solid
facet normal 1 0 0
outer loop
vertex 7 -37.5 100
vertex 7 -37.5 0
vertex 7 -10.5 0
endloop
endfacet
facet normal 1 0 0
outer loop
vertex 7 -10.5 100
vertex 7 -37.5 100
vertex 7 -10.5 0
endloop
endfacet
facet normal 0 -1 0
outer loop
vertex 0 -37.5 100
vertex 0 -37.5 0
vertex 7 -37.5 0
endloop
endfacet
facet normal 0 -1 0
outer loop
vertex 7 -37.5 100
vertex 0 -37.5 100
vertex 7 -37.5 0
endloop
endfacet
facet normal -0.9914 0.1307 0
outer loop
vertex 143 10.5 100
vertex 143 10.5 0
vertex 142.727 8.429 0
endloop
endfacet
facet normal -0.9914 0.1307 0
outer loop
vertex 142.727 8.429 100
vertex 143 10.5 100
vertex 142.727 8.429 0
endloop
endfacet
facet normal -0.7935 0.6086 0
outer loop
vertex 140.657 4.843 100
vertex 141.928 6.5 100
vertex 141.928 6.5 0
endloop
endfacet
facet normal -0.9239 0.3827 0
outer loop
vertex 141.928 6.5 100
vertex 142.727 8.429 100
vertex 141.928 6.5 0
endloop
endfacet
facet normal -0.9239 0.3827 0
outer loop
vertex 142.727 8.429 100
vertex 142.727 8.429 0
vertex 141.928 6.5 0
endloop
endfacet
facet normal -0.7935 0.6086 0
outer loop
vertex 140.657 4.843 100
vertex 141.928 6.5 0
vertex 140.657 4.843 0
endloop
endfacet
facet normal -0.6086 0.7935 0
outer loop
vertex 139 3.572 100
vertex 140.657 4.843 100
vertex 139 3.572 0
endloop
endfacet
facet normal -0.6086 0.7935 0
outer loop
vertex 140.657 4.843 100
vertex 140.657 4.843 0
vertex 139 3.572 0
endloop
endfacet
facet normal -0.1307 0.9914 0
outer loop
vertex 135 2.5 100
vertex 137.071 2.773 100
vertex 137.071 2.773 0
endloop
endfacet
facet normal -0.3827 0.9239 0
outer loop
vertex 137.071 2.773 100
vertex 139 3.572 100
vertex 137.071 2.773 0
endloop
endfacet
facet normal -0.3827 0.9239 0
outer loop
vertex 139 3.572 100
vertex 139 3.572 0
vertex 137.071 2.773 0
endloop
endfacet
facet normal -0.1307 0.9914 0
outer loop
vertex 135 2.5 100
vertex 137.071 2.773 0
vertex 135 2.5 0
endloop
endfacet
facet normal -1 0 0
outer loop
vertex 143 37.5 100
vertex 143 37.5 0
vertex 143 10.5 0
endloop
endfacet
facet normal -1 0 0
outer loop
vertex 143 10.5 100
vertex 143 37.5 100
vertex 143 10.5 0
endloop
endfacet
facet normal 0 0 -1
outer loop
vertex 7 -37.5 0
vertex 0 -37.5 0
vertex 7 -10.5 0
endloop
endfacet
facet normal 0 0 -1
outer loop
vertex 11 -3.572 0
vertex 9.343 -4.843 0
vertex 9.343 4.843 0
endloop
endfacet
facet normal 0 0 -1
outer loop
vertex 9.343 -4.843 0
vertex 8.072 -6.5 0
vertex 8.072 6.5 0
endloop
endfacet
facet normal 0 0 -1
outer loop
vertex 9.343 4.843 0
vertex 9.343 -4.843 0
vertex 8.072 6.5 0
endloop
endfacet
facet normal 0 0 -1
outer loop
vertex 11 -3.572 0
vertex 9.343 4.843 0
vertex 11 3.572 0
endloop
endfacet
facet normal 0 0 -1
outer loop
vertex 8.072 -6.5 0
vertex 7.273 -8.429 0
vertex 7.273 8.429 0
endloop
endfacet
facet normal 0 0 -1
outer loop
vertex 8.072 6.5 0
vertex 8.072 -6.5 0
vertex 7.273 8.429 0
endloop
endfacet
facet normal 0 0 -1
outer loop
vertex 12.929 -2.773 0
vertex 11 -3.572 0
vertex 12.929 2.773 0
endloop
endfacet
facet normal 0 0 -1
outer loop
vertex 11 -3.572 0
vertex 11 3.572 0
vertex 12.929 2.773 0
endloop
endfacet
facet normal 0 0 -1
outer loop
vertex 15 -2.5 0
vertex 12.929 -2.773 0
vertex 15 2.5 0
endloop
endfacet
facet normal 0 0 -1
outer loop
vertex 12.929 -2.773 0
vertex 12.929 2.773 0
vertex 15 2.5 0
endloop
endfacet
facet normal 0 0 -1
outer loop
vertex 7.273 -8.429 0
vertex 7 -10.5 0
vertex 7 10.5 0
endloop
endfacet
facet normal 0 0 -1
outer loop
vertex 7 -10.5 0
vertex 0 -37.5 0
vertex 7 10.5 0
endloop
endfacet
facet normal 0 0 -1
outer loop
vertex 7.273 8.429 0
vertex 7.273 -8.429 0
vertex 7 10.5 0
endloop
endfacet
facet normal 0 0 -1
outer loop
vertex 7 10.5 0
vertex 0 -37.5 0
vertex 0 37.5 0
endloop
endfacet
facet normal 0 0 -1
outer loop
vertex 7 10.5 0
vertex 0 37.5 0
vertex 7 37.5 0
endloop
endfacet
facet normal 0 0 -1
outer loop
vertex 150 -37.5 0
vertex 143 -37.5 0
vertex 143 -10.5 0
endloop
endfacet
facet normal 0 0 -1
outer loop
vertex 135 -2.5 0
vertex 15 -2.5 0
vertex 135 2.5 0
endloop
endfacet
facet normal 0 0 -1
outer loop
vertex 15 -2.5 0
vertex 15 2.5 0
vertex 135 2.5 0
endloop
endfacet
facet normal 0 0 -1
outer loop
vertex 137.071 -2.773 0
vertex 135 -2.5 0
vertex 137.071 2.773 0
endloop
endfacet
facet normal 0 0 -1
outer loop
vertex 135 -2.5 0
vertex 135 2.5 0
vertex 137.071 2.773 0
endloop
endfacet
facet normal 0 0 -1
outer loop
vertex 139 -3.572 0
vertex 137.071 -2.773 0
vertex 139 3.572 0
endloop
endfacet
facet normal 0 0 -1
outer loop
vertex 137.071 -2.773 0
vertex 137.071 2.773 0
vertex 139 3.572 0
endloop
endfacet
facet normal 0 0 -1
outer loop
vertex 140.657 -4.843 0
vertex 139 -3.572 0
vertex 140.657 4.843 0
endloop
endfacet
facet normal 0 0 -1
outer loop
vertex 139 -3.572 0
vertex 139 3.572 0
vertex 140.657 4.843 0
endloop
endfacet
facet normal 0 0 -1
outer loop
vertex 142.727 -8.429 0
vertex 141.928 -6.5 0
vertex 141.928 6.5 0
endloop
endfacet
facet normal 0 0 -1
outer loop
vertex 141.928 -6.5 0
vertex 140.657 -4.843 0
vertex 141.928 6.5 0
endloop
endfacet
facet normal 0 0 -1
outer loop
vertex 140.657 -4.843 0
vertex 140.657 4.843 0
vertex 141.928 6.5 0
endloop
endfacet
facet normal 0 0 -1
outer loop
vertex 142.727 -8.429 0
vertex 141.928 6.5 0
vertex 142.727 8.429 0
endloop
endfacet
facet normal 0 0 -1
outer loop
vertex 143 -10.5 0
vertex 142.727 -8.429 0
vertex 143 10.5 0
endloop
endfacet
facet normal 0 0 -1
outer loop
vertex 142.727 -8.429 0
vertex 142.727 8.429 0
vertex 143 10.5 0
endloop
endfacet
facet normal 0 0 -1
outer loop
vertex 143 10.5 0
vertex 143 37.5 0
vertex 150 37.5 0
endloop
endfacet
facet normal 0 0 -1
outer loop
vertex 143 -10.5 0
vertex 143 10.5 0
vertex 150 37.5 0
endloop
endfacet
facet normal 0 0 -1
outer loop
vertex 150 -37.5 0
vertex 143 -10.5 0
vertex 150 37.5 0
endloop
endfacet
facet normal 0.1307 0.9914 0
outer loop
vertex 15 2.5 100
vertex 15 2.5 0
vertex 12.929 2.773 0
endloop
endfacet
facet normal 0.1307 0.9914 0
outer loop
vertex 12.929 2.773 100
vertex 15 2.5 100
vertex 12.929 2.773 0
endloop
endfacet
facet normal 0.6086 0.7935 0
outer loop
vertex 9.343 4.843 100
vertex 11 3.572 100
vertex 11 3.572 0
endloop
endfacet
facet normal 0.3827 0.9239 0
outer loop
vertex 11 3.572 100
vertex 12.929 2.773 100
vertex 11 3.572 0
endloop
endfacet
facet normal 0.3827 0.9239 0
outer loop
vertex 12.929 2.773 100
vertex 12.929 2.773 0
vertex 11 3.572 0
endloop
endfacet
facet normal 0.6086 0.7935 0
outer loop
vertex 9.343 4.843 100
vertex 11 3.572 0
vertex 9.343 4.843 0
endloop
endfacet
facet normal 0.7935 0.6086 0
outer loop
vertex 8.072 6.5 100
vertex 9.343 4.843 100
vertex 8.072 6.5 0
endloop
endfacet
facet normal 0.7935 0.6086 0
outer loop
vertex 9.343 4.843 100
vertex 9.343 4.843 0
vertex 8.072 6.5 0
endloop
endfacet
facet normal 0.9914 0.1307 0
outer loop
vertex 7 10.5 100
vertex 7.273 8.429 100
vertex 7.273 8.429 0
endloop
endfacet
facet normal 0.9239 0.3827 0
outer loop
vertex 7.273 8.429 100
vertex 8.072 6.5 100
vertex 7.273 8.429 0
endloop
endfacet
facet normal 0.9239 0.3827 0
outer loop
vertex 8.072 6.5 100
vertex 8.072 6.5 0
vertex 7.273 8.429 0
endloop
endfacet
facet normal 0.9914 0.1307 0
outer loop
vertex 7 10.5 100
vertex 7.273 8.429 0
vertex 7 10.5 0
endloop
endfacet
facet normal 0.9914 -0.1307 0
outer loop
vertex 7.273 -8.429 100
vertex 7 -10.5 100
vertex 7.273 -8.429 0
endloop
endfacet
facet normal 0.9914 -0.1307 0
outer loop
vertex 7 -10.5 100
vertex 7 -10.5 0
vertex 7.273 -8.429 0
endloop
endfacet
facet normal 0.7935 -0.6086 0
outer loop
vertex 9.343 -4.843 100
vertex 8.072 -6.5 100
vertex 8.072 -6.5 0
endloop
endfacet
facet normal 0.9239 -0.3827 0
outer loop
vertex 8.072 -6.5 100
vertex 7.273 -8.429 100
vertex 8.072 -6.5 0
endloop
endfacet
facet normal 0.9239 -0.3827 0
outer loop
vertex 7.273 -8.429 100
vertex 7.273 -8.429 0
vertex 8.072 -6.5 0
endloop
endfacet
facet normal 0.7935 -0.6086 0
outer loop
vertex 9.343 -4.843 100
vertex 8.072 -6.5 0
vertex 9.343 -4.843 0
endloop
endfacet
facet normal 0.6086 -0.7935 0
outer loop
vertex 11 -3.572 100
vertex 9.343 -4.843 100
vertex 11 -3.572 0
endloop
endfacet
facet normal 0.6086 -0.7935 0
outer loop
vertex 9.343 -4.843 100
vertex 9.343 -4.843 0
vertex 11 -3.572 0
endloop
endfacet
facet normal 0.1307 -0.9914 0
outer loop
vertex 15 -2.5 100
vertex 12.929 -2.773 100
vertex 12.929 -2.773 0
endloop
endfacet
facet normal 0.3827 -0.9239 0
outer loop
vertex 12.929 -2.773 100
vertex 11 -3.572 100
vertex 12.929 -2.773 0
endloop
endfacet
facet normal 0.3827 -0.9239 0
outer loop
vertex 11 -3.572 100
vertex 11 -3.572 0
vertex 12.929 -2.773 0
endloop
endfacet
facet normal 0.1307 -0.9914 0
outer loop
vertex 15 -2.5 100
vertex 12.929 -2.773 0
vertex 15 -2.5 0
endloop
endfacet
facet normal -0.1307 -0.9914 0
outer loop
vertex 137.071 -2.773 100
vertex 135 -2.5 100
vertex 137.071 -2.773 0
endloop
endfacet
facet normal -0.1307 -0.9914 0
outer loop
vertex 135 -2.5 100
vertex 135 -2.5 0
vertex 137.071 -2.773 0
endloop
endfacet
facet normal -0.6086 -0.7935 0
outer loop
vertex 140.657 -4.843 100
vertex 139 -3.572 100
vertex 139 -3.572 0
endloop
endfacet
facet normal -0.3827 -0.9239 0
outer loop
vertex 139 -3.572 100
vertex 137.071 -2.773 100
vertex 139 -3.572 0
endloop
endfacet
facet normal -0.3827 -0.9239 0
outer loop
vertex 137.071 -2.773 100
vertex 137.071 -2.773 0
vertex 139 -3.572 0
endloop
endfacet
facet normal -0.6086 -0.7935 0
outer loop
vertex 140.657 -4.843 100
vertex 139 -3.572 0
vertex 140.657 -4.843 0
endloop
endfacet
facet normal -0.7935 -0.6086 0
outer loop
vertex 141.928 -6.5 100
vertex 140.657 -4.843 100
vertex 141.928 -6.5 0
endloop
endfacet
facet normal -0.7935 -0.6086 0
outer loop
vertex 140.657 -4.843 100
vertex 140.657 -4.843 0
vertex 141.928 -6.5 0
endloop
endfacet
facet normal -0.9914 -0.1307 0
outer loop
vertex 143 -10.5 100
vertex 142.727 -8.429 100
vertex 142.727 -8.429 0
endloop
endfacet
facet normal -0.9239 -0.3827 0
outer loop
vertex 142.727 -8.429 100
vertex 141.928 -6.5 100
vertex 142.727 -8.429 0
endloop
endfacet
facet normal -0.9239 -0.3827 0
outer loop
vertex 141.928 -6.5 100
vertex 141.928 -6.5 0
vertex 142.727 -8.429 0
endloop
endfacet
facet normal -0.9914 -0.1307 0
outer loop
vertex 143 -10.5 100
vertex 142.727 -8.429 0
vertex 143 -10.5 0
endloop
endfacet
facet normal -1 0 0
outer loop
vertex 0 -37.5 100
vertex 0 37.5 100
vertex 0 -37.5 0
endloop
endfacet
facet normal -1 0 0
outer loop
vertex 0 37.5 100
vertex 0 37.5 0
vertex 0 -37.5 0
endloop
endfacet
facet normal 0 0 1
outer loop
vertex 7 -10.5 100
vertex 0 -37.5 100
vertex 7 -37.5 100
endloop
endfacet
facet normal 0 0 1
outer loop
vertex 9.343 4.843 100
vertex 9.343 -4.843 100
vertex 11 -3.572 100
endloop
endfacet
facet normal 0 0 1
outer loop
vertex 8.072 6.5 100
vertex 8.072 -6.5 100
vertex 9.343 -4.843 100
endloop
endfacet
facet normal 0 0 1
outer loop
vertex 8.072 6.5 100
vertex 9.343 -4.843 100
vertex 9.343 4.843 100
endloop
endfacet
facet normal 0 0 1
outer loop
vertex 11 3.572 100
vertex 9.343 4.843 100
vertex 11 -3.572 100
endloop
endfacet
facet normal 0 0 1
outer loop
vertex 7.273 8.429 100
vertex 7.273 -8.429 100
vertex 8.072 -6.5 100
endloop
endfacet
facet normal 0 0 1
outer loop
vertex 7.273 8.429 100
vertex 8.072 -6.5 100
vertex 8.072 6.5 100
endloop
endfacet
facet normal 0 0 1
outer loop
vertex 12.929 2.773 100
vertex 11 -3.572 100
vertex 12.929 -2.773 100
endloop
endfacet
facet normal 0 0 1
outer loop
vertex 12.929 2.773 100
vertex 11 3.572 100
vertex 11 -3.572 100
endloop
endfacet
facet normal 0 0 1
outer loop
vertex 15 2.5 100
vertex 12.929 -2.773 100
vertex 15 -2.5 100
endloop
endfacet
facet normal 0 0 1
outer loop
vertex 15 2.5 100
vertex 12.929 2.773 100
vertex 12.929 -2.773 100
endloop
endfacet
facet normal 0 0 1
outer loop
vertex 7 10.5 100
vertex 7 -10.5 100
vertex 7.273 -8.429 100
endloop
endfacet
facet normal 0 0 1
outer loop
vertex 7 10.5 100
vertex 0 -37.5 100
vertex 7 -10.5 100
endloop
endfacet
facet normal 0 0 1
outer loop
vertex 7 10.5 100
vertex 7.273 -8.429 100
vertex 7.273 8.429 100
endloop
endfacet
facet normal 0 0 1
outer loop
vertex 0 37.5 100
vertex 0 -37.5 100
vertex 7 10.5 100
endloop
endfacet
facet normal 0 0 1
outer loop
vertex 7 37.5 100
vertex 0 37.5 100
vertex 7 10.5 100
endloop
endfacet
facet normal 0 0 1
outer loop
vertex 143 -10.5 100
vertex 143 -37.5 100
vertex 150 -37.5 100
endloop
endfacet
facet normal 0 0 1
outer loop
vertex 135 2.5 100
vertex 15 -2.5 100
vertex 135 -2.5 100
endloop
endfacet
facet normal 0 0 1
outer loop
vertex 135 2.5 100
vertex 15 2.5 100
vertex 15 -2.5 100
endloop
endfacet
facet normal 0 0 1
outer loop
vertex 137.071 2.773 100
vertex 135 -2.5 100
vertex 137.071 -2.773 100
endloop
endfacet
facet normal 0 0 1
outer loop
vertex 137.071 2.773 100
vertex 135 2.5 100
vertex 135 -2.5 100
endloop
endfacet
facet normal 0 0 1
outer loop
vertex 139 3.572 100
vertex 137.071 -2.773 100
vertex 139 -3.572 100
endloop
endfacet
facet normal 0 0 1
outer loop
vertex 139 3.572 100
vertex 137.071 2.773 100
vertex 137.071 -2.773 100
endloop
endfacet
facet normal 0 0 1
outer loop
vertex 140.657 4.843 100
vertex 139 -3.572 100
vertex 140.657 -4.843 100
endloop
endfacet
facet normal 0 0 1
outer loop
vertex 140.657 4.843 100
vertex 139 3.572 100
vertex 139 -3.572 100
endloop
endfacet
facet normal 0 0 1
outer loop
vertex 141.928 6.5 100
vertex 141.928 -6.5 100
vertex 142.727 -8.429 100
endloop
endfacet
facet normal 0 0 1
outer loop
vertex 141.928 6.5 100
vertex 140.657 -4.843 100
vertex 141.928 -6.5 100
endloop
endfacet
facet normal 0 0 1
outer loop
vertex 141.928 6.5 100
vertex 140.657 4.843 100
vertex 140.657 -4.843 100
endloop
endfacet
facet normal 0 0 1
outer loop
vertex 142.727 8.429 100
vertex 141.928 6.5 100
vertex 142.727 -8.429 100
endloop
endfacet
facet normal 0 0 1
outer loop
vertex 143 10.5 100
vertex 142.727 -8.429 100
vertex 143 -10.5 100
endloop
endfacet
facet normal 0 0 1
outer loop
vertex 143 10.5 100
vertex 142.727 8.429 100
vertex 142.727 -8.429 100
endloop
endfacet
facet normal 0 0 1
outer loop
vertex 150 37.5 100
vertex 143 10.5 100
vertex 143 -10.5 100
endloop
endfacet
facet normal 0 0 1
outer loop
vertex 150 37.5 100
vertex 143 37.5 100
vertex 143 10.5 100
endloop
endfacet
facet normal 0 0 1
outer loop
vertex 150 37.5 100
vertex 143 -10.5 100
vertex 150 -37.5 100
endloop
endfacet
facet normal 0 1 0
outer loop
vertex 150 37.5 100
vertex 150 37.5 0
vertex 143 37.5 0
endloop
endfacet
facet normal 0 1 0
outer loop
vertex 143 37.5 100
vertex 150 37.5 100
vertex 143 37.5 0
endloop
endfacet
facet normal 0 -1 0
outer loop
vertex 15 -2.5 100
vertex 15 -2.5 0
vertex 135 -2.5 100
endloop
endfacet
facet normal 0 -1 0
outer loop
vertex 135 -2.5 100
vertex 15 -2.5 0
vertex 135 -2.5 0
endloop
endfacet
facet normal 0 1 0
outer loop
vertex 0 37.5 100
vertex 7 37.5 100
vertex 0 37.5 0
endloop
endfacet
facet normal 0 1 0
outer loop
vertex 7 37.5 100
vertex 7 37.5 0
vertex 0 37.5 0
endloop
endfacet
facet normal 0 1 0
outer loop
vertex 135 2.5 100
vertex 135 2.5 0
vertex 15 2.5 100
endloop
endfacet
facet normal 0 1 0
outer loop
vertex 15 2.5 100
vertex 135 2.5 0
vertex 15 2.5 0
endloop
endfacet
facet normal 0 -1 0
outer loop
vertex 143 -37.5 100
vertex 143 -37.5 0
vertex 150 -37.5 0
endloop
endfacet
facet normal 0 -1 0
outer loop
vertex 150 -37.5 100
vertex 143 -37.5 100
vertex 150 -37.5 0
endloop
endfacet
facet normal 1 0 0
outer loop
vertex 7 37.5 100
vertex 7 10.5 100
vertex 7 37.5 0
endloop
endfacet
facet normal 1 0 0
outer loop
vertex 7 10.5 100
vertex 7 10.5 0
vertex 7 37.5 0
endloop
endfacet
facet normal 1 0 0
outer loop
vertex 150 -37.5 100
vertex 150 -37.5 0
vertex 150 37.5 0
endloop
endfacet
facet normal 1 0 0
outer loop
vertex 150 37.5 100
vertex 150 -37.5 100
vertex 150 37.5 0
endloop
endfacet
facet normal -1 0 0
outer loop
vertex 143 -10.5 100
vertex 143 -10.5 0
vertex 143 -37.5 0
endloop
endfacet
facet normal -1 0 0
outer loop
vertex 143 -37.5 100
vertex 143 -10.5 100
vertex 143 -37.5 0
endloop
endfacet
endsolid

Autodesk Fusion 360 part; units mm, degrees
sketch "スケッチ1" plane through (0, 0, 0) normal (0, 0, 1) x (1, 0, 0)
  line L0 (0, 37.5) -> (0, -37.5)
  line L1 (150, -37.5) -> (150, 37.5)
  line L2 (143, -10.5) -> (143, -37.5)
  line L3 (7, -37.5) -> (7, -10.5)
  line L4 (0, -37.5) -> (7, -37.5)
  line L5 (143, -37.5) -> (150, -37.5)
  line L6 (135, 2.5) -> (15, 2.5)
  line L7 (15, -2.5) -> (135, -2.5)
  arc A0 (7, 10.5) -> (15, 2.5) centre (15, 10.5) ccw
  arc A1 (15, -2.5) -> (7, -10.5) centre (15, -10.5) ccw
  line L8 (7, 37.5) -> (0, 37.5)
  line L9 (7, 10.5) -> (7, 37.5)
  arc A2 (135, 2.5) -> (143, 10.5) centre (135, 10.5) ccw
  arc A3 (143, -10.5) -> (135, -2.5) centre (135, -10.5) ccw
  line L10 (143, 37.5) -> (143, 10.5)
  line L11 (150, 37.5) -> (143, 37.5)
extrude "押し出し1" add sketch "スケッチ1" along normal blind 100
